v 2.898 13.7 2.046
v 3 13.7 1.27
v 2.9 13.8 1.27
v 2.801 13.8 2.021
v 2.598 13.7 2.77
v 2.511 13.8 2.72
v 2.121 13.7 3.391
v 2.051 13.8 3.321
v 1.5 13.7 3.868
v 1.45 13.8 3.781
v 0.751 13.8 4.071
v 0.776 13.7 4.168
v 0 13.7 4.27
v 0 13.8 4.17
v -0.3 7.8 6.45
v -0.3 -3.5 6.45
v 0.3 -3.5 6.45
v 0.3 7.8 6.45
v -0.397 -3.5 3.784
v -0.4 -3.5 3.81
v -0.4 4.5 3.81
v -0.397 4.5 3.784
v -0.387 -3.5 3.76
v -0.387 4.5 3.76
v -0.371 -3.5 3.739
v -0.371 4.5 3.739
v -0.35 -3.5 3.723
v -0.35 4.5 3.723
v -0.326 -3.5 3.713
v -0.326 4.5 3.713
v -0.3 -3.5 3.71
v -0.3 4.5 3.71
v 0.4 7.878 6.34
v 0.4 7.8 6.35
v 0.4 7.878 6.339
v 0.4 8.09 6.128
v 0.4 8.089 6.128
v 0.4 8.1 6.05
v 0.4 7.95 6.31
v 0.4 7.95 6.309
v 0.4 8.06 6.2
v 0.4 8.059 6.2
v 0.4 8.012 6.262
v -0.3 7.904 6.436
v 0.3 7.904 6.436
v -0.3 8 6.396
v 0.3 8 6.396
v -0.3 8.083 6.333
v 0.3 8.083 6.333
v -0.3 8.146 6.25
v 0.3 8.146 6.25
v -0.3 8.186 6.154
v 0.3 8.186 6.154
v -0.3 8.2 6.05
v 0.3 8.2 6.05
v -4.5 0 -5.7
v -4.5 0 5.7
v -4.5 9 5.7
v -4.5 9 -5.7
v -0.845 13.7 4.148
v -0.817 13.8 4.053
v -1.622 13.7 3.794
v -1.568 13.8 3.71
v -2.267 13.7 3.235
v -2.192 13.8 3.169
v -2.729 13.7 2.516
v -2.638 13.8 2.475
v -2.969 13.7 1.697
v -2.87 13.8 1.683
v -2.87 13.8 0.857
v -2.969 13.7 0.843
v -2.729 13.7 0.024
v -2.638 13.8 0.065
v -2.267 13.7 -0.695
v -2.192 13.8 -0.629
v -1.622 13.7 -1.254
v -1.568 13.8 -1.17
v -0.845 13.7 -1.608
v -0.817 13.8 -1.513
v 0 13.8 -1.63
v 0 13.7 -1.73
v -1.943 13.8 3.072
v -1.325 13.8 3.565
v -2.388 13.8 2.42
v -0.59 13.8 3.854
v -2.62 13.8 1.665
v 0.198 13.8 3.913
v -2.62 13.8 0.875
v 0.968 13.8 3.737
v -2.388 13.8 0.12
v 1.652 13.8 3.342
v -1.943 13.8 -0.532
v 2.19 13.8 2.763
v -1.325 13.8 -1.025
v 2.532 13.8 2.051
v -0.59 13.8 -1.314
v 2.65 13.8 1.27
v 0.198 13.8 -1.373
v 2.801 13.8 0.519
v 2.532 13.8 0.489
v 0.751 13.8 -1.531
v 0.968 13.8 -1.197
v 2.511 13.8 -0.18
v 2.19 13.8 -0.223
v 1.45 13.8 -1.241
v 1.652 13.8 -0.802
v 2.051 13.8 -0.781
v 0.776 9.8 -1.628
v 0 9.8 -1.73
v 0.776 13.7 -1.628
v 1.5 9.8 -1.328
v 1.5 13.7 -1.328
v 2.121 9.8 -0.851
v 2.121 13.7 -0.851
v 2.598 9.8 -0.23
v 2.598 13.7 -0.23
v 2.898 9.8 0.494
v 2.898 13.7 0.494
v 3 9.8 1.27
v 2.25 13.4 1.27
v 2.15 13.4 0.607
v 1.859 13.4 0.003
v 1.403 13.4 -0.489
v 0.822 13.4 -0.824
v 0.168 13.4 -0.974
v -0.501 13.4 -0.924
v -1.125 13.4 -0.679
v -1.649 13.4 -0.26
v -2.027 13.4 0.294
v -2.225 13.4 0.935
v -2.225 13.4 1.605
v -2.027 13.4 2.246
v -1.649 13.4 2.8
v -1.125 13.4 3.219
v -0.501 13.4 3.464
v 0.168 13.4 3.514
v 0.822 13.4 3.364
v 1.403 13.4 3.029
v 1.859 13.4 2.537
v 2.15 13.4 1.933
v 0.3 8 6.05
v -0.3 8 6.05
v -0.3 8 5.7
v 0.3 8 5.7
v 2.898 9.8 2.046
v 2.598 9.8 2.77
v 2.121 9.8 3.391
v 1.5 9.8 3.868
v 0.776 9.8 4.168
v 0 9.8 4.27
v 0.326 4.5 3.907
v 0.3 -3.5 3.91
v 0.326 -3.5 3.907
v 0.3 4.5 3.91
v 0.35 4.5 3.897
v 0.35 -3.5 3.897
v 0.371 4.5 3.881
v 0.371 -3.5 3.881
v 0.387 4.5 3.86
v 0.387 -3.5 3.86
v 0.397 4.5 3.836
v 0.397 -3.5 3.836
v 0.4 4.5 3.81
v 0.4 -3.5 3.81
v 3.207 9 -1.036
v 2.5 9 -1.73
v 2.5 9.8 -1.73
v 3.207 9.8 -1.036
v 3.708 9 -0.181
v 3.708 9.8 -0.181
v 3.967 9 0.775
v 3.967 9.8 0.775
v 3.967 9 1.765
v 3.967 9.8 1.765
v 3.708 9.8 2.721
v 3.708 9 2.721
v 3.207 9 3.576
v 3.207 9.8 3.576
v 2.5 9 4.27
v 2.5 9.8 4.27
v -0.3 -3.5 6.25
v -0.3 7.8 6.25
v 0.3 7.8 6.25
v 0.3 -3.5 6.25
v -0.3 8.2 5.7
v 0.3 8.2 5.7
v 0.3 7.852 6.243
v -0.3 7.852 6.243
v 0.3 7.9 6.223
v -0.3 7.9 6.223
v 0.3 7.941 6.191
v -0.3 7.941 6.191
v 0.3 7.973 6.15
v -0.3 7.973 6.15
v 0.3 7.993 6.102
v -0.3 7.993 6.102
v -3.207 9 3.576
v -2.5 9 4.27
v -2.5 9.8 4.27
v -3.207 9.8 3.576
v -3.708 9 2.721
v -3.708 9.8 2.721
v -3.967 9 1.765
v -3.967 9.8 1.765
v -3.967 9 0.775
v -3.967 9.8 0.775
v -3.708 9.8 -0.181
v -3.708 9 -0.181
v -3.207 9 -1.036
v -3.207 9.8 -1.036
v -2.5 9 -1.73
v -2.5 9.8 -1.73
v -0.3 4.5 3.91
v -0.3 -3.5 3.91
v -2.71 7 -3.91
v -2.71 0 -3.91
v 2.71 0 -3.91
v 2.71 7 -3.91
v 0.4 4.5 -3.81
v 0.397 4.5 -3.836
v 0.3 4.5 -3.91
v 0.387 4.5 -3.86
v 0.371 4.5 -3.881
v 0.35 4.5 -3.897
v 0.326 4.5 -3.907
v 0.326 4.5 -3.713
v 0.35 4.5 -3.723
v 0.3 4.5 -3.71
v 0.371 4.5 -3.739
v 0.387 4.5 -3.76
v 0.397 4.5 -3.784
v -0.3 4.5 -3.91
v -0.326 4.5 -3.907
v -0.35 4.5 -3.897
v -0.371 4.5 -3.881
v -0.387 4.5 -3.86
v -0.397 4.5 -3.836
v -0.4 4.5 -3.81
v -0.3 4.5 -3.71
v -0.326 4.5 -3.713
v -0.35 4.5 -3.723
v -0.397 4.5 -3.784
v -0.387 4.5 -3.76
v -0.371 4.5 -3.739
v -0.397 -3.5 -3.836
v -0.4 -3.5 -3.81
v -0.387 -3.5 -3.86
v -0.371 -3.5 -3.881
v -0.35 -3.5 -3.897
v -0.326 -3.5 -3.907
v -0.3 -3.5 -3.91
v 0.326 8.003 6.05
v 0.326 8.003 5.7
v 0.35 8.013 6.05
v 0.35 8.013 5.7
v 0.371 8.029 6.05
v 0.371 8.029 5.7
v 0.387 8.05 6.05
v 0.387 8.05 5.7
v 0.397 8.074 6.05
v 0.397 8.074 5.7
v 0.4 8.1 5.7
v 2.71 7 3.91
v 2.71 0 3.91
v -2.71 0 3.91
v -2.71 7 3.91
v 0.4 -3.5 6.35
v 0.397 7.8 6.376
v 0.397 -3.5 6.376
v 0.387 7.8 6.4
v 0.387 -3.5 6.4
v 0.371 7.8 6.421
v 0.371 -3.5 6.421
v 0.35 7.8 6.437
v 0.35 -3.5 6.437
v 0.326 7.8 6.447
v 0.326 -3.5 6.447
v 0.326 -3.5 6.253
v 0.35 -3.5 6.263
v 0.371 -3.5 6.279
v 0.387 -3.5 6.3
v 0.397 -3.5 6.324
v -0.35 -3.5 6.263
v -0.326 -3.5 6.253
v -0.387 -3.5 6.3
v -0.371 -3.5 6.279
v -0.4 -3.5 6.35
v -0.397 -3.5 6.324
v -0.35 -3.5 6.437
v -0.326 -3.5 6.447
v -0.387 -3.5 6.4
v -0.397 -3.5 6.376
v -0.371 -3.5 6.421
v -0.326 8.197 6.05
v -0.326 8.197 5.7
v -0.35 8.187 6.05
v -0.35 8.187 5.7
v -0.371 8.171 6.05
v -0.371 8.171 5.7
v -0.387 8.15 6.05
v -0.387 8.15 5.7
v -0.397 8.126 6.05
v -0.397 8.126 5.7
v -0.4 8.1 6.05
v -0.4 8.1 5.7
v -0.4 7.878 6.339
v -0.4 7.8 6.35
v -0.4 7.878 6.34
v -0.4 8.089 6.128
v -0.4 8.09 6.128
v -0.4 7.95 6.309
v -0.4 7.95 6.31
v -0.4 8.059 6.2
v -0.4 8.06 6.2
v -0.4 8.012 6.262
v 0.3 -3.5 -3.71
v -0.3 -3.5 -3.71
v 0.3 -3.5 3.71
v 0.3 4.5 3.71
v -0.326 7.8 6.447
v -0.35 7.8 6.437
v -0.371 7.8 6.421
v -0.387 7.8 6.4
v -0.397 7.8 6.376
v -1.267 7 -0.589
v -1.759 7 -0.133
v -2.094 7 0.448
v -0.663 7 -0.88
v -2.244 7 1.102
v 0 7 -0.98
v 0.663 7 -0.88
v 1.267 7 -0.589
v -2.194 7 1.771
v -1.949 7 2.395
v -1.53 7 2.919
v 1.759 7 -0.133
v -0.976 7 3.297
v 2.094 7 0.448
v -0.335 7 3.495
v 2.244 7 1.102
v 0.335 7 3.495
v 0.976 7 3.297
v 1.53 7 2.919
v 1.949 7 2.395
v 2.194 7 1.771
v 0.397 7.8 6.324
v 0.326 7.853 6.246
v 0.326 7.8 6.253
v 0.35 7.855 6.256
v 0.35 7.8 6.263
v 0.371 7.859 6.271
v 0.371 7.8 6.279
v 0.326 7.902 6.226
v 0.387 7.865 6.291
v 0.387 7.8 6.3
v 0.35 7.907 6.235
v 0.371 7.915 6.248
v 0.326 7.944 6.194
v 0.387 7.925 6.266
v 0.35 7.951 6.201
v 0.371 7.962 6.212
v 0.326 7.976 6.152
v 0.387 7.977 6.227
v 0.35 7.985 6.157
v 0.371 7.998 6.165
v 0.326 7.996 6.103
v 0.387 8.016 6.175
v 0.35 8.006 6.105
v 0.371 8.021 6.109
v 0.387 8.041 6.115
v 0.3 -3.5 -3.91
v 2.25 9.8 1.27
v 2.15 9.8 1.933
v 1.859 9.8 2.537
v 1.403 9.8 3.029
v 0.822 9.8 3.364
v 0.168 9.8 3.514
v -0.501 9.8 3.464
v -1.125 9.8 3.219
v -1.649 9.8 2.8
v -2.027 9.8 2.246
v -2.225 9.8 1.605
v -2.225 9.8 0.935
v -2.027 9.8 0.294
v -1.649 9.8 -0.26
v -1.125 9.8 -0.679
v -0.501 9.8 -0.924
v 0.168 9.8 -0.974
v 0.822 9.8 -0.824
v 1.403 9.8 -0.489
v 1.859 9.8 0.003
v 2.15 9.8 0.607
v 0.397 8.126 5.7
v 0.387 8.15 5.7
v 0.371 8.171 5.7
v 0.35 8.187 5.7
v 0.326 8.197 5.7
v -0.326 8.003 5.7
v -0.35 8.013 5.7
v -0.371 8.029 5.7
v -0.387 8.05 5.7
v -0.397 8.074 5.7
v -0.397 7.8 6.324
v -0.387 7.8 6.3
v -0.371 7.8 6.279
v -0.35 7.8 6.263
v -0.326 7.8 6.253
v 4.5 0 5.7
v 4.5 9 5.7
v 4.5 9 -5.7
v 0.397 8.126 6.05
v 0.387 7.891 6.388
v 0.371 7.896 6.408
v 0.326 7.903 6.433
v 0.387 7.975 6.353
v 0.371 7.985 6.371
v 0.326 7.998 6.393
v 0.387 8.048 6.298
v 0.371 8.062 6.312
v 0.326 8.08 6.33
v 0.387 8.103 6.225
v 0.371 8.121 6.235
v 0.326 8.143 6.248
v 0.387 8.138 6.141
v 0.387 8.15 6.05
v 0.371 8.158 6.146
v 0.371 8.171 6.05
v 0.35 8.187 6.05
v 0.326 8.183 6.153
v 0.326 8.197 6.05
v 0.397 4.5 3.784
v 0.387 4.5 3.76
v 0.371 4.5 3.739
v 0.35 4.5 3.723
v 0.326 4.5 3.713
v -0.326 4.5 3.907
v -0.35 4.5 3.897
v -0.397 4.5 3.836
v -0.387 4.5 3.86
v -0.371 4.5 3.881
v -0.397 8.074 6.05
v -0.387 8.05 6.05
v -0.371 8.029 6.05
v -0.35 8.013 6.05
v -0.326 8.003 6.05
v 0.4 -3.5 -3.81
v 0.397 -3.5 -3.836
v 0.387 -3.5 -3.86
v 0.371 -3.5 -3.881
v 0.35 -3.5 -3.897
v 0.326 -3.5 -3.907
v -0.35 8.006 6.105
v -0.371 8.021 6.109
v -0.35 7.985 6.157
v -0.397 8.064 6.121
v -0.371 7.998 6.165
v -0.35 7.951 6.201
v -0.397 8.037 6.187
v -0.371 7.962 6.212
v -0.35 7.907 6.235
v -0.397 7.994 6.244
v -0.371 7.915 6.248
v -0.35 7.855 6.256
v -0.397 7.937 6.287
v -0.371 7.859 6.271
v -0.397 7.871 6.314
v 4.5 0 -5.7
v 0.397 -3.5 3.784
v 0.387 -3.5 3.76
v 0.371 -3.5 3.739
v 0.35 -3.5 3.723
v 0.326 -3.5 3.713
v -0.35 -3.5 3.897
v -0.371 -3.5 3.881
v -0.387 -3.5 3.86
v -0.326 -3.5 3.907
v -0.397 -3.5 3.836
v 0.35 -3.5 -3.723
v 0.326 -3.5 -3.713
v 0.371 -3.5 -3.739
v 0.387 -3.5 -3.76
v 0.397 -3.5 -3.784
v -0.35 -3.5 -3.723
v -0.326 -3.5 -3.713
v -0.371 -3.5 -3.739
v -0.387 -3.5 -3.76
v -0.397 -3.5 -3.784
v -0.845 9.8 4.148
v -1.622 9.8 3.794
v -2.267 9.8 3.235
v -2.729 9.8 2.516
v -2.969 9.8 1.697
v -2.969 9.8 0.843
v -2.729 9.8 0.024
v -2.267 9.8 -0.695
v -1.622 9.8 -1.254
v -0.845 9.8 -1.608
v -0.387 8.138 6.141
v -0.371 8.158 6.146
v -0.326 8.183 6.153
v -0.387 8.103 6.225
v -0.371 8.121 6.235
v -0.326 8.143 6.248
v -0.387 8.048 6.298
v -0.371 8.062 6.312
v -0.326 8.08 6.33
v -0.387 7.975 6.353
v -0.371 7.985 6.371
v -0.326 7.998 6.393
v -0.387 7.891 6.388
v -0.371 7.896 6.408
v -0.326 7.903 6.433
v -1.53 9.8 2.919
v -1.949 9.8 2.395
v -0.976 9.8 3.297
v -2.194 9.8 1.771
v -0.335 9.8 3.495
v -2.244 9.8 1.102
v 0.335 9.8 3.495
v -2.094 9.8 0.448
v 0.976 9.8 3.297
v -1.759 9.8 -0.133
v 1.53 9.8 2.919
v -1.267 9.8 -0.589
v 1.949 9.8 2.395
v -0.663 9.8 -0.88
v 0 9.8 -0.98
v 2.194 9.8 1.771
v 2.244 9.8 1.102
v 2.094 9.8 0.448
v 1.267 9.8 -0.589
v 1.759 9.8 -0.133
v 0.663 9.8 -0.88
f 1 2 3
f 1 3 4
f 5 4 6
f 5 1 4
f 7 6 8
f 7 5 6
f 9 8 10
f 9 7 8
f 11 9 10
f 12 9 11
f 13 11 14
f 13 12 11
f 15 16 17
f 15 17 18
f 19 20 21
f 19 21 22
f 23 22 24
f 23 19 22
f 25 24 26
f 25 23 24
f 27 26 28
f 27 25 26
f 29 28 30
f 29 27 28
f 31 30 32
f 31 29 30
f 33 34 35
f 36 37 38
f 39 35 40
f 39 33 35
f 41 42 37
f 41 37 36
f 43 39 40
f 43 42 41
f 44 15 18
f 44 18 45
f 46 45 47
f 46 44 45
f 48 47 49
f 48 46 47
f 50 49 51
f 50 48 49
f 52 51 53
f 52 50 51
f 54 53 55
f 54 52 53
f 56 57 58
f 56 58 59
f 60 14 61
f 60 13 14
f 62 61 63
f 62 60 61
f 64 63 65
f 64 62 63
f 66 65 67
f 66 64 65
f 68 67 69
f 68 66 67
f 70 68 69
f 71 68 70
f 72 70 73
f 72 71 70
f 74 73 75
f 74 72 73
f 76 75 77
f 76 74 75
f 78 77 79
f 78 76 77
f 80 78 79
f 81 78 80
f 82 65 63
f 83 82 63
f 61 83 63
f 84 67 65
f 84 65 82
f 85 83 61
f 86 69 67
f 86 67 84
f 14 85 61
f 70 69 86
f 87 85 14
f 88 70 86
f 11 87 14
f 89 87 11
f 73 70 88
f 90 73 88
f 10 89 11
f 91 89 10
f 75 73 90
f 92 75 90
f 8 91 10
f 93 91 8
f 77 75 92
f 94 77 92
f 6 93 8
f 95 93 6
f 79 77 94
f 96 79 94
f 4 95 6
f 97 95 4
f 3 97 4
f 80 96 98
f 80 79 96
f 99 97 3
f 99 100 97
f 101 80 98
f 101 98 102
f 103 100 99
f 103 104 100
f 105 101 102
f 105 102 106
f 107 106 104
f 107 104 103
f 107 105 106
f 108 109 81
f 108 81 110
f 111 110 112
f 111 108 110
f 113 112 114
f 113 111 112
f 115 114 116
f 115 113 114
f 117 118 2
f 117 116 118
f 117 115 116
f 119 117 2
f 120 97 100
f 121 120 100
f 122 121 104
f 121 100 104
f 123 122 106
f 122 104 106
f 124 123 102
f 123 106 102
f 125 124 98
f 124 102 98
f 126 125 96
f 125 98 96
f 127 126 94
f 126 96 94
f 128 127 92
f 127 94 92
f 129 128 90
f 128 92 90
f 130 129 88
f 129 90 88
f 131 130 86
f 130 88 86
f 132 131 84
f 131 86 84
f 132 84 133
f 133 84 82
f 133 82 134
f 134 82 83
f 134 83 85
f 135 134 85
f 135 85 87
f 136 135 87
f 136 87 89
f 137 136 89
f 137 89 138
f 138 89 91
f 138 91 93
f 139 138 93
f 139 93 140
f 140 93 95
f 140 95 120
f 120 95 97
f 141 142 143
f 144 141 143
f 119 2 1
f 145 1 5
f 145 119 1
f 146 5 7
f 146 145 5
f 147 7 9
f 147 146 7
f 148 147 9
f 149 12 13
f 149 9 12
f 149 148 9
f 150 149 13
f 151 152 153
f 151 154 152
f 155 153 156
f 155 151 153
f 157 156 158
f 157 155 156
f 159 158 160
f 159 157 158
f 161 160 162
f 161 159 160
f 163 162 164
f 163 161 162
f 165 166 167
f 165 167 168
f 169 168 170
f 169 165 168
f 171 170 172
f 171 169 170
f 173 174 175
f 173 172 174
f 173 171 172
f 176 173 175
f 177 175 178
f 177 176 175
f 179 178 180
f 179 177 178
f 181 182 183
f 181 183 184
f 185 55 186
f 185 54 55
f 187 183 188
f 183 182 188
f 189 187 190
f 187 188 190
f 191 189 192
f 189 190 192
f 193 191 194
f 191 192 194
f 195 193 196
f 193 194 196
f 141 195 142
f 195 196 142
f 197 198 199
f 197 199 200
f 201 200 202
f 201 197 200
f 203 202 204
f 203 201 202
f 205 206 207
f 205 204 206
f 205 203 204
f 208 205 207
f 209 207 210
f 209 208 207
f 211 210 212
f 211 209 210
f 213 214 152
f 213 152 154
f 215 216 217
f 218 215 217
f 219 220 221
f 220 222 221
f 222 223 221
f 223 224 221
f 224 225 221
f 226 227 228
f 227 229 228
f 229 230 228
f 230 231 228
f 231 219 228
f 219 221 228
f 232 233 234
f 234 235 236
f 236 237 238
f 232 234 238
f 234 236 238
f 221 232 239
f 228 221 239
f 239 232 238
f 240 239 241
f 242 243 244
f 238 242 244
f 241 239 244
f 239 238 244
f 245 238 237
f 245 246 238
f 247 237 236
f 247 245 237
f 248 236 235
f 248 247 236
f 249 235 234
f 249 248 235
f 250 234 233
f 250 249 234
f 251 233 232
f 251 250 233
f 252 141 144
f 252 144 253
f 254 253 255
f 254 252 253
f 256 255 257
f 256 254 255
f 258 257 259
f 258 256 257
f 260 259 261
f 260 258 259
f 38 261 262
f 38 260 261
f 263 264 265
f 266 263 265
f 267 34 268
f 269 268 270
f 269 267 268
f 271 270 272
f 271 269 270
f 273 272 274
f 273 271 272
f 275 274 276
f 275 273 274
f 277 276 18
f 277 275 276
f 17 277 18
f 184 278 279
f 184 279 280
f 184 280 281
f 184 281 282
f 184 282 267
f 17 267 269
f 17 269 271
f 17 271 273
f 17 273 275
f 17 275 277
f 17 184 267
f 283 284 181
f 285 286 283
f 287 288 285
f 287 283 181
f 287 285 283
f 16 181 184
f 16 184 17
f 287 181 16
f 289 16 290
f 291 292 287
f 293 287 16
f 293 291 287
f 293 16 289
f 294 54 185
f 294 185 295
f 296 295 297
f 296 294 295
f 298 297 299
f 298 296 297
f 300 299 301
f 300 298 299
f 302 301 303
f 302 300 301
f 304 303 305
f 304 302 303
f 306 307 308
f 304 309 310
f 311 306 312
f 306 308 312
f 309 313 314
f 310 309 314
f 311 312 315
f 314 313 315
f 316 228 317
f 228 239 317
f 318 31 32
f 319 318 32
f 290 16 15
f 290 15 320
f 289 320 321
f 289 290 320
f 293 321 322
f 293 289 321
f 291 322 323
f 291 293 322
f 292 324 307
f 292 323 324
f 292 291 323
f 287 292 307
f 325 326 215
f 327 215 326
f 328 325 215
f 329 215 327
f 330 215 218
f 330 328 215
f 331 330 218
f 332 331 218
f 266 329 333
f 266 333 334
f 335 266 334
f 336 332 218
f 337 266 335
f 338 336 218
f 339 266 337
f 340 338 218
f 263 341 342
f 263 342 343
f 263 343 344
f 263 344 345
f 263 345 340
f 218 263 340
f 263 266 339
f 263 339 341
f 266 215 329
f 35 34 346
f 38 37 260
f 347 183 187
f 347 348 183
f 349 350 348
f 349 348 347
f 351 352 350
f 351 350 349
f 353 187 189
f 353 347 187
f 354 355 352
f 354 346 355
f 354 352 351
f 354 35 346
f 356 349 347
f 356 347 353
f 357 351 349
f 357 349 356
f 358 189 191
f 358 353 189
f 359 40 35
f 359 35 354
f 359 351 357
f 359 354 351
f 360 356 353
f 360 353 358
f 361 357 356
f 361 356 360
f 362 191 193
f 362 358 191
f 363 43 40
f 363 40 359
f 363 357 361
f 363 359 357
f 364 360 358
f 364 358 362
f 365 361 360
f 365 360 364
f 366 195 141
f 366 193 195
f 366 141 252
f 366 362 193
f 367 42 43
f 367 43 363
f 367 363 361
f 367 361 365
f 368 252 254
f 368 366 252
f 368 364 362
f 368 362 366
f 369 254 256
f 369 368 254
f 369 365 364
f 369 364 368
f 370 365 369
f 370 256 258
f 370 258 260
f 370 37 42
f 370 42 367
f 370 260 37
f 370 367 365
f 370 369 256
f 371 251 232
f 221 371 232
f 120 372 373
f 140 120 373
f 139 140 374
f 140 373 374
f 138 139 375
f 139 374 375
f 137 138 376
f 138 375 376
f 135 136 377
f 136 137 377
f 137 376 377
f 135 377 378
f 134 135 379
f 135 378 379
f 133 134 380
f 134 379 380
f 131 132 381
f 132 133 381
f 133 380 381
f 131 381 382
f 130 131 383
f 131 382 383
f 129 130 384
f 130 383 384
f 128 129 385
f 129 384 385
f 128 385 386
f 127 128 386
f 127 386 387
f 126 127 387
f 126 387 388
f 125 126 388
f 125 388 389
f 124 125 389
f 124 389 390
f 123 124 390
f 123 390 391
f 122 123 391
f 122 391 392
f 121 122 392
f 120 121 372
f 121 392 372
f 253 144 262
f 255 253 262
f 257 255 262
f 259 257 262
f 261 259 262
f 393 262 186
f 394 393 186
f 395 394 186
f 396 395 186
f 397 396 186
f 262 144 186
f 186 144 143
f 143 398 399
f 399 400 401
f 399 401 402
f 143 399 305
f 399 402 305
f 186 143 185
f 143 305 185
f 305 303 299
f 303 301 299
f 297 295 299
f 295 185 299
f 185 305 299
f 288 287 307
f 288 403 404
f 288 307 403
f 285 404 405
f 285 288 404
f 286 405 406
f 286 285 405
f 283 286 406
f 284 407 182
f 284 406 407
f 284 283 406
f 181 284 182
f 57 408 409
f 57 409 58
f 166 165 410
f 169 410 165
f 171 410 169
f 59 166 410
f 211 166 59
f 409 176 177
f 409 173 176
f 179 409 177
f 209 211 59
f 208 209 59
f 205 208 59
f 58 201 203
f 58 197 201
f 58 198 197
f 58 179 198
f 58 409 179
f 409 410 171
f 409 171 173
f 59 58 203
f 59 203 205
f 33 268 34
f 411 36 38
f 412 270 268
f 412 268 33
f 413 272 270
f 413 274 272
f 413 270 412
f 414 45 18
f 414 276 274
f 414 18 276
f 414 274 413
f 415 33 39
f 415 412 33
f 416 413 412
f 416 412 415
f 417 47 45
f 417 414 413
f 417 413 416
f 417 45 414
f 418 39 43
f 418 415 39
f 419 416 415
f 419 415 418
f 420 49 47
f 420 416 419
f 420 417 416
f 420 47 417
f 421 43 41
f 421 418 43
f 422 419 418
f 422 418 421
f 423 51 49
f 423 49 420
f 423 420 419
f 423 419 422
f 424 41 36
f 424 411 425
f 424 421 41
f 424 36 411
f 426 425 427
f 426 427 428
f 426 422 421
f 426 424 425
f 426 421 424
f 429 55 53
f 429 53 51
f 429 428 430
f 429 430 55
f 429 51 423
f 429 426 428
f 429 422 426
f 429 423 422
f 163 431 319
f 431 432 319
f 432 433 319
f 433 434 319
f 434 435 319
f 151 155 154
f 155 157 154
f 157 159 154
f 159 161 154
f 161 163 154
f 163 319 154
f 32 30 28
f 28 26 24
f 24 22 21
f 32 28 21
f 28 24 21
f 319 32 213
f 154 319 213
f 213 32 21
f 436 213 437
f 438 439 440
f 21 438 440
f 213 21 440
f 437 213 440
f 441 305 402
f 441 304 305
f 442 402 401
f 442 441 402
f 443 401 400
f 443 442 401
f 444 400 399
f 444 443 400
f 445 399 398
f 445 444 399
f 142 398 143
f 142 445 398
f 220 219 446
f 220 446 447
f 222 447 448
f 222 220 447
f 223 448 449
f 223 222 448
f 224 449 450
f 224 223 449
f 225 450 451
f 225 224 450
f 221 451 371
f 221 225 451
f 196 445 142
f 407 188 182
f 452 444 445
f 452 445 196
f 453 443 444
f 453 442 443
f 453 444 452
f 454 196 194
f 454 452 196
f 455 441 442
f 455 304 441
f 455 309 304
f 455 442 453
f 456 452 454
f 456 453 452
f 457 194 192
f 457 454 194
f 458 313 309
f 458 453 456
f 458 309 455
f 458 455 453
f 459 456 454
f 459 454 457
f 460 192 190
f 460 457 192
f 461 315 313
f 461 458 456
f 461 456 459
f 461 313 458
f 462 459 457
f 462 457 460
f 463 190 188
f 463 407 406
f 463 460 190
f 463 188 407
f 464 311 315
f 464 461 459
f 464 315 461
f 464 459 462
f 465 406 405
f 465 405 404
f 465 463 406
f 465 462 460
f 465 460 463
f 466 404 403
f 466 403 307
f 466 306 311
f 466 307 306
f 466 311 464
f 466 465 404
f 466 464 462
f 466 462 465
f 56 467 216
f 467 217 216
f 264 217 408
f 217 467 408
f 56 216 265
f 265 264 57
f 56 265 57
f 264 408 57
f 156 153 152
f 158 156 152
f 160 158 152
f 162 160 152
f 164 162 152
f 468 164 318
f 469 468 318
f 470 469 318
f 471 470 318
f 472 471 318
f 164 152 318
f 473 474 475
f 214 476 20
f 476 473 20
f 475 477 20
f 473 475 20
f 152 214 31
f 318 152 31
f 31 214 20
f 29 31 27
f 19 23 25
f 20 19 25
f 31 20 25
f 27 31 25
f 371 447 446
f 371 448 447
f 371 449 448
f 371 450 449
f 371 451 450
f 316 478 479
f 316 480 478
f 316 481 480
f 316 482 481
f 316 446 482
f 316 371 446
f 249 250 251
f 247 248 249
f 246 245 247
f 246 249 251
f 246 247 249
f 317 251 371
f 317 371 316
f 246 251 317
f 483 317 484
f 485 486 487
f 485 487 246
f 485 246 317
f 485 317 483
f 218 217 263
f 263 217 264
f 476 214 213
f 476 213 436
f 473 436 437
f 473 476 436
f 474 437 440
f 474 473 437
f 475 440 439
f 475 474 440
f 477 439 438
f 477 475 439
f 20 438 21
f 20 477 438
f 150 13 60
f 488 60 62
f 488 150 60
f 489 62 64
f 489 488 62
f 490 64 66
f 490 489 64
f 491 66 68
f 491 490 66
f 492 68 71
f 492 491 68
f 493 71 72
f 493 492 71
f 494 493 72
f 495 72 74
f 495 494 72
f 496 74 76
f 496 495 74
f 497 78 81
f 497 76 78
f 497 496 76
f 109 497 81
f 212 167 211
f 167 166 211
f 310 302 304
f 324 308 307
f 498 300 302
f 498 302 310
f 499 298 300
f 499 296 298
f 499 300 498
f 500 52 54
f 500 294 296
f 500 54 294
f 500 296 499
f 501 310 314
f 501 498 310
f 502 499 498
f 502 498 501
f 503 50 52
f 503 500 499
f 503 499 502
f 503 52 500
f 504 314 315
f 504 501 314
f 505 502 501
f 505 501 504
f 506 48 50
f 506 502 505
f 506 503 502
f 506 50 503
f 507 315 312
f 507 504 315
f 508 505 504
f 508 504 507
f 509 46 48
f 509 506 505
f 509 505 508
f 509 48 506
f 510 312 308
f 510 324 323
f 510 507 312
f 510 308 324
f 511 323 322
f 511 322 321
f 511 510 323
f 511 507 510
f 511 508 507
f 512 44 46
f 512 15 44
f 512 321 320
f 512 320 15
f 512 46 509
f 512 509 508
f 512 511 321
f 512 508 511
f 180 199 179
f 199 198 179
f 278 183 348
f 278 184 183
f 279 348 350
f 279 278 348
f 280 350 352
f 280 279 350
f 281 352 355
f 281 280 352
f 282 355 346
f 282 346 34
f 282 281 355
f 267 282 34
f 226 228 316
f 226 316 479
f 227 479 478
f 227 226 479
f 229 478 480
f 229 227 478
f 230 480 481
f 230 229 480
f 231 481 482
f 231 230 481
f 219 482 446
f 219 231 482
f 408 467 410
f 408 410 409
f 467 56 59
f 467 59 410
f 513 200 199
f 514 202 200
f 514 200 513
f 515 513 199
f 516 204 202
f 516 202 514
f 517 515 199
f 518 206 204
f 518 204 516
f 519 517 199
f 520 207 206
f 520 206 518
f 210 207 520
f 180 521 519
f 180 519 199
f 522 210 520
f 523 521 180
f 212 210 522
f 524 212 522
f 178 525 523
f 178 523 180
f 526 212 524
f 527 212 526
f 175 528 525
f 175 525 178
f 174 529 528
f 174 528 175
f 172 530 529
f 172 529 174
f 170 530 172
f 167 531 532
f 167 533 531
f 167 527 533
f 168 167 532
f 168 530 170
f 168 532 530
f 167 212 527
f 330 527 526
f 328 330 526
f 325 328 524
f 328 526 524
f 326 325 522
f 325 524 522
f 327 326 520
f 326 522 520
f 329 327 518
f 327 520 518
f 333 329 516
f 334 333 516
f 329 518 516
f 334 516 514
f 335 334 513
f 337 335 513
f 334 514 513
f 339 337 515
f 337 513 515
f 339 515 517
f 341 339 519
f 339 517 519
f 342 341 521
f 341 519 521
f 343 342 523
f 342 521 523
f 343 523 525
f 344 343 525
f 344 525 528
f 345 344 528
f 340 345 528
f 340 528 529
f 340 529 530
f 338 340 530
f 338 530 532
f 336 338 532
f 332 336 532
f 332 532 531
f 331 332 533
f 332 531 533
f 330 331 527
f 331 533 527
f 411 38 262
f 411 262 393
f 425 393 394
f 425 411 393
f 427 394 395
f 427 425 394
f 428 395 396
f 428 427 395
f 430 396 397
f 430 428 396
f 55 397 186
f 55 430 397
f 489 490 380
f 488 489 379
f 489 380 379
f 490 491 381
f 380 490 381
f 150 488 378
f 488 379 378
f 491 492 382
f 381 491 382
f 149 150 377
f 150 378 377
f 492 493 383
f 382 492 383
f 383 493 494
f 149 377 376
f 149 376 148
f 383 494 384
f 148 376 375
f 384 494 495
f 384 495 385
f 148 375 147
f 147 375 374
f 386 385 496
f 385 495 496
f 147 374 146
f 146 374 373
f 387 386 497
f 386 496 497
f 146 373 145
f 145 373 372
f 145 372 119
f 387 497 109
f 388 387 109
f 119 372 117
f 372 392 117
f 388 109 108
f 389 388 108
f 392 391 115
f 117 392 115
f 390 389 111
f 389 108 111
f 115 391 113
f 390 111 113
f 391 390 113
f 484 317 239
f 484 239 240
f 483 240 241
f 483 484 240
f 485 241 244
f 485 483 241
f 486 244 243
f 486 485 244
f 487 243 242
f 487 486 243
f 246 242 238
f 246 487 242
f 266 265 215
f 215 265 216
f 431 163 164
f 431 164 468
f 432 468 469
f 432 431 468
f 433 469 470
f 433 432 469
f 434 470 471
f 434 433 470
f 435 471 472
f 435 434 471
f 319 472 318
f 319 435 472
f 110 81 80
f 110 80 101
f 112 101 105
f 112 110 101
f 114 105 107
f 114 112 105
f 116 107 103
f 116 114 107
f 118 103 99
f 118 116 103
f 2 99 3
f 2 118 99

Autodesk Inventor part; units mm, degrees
ref_plane "YZ Plane" through (0, 0, 0) normal (1, 0, 0) x (0, 1, 0)
ref_plane "XZ Plane" through (0, 0, 0) normal (0, 1, 0) x (-1, 0, 0)
ref_plane "XY Plane" through (0, 0, 0) normal (0, 0, 1) x (1, 0, 0)
sketch "Sketch1" plane through (0, 0, 0) normal (0, 1, 0) x (-1, 0, 0)
  line L0 (-4.5, 5.7) -> (4.5, 5.7)
  line L1 (4.5, 5.7) -> (4.5, -5.7)
  line L2 (4.5, -5.7) -> (-4.5, -5.7)
  line L3 (-4.5, -5.7) -> (-4.5, 5.7)
  line L4 (-4.5, 5.7) -> (4.5, -5.7) construction
  line L5 (4.5, 5.7) -> (-4.5, -5.7) construction
  point P0 (0, 0)
  dimension "d0" = 9
  dimension "d1" = 11.4
extrude "Extrusion1" add sketch "Sketch1" along normal blind 9
sketch "Sketch2" plane through (0, 0, 0) normal (0, -1, 0) x (1, 0, 0)
  line L0 (4.5, 5.7) -> (-4.5, 5.7) projected
  line L1 (-4.5, 5.7) -> (-4.5, -5.7) projected
  line L2 (-4.5, -5.7) -> (4.5, -5.7) projected
  line L3 (4.5, -5.7) -> (4.5, 5.7) projected
  line L4 (2.71, 3.91) -> (-2.71, 3.91)
  line L5 (-2.71, 3.91) -> (-2.71, -3.91)
  line L6 (-2.71, -3.91) -> (2.71, -3.91)
  line L7 (2.71, -3.91) -> (2.71, 3.91)
  point P0 (0, 0)
  dimension "d4" = 7.82
extrude "Extrusion2" cut sketch "Sketch2" against normal blind 7 contours L7 L6 L5 L4
sketch "Sketch4" plane through (0, 9, 0) normal (0, 1, 0) x (1, 0, 0)
  line L0 (0, 0) -> (0, -1.27)
  line L1 (2.5, -4.27) -> (2.5, 1.73)
  line L2 (2.5, 1.73) -> (-2.5, 1.73)
  line L3 (-2.5, 1.73) -> (-2.5, -4.27)
  line L4 (-2.5, -4.27) -> (2.5, -4.27)
  line L5 (2.5, -4.27) -> (-2.5, 1.73) construction
  line L6 (2.5, 1.73) -> (-2.5, -4.27) construction
  arc A0 (-2.5, 1.73) -> (-2.5, -4.27) centre (-0.25, -1.27) ccw
  arc A1 (2.5, -4.27) -> (2.5, 1.73) centre (0.25, -1.27) ccw
  dimension "d17" = 1.27
  dimension "d18" = 6
  dimension "d19" = 5
  dimension "d20" = 3.75
  dimension "d21" = 3.75
extrude "Extrusion4" add sketch "Sketch4" along normal blind 0.8
sketch "Sketch5" plane through (0, 9.8, 0) normal (0, 1, 0) x (1, 0, 0)
  arc A0 (2.5, -4.27) -> (2.5, 1.73) centre (0.25, -1.27) ccw projected
  line L0 (2.5, 1.73) -> (-2.5, 1.73) projected
  arc A1 (-2.5, 1.73) -> (-2.5, -4.27) centre (-0.25, -1.27) ccw projected
  line L1 (-2.5, -4.27) -> (2.5, -4.27) projected
  line L2 (0.25, -1.27) -> (-0.25, -1.27)
  circle A2 centre (0, -1.27) radius 3
  circle A3 centre (0, -1.27) radius 2.25
  point P0 (0, 0)
  dimension "d24" = 6
  dimension "d25" = 4.5
extrude "Extrusion5" add sketch "Sketch5" along normal blind 4 separate body contours A2
chamfer "Chamfer1" distance 0.4 angle 45 1 edges at (-2.25, 13.8, 1.27)
chamfer "Chamfer2" distance 0.1 angle 45 1 edges at (-3, 13.8, 1.27)
sketch "Sketch6" plane through (0, 0, 0) normal (1, 0, 0) x (0, 1, 0)
  line L0 (0, 5.7) -> (0, -5.7) projected
  line L1 (8, 6.05) -> (8, 5.7)
  line L2 (8, 5.7) -> (8.2, 5.7)
  line L3 (0, 5.7) -> (9, 5.7) projected
  line L4 (7.8, 6.25) -> (0, 6.25)
  line L5 (0, 6.25) -> (-3.5, 6.25)
  line L6 (-3.5, 6.25) -> (-3.5, 6.45)
  line L7 (-3.5, 6.45) -> (7.8, 6.45)
  line L8 (8, 5.7) -> (8.2, 5.7)
  line L9 (0, 3.91) -> (7, 3.91) projected
  line L10 (0, -3.91) -> (7, -3.91) projected
  line L11 (0, -3.91) -> (0, 3.91) projected
  arc A0 (8, 6.05) -> (7.8, 6.25) centre (7.8, 6.05) ccw
  arc A1 (8.2, 6.05) -> (7.8, 6.45) centre (7.8, 6.05) ccw
  line L12 (8.2, 6.05) -> (8.2, 5.7)
  line L13 (-3.5, -3.91) -> (4.5, -3.91)
  line L14 (4.5, -3.91) -> (4.5, -3.71)
  line L15 (4.5, -3.71) -> (-3.5, -3.71)
  line L16 (0, 3.91) -> (7, 3.91) projected
  line L17 (-3.5, 3.71) -> (4.5, 3.71)
  line L18 (4.5, 3.71) -> (4.5, 3.91)
  line L19 (4.5, 3.91) -> (-3.5, 3.91)
  line L20 (-3.5, 3.91) -> (-3.5, 3.71)
  line L21 (-3.5, -3.91) -> (-3.5, -3.71)
  point P0 (0, 0)
  point P1 (8.2, 6.45)
  point P2 (0, 3.71)
  point P3 (0, -3.71)
  dimension "d37" = 0.2
  dimension "d42" = 3.5
  dimension "d43" = 0.2
  dimension "d44" = 0.2
  dimension "d45" = 0.2
  dimension "d46" = 0.4
  dimension "d49" = 8
  dimension "d50" = 8
extrude "Extrusion6" add sketch "Sketch6" along normal mid plane 0.8 separate body
fillet "Fillet1" radius 0.1 20 edges at (-0.4, 0.5, -3.91) (-0.4, 0.5, -3.71) (0.4, 0.5, -3.71) (-0.4, 7.9414, 6.1914) (-0.4, 8, 5.875) (-0.4, 2.15, 6.25) (-0.4, 8.0828, 6.3328) (-0.4, 8.2, 5.875) (-0.4, 2.15, 6.45) (0.4, 8.0828, 6.3328) (0.4, 8.2, 5.875) (0.4, 2.15, 6.45) (-0.4, 0.5, 3.71) (-0.4, 0.5, 3.91) (0.4, 0.5, 3.91) (0.4, 0.5, -3.91) (0.4, 0.5, 3.71) (0.4, 7.9414, 6.1914) (0.4, 8, 5.875) (0.4, 2.15, 6.25)
sketch "Sketch7" plane through (0, 9.8, 1.27) normal (0, 1, 0) x (0, 0, -1)
  circle A0 centre (0, 0) radius 2.25 projected
  point P0 (1.27, 0)
extrude "Extrusion7" cut sketch "Sketch7" against normal through all bodies 1
properties part number "KNOBICONN_TRS"
